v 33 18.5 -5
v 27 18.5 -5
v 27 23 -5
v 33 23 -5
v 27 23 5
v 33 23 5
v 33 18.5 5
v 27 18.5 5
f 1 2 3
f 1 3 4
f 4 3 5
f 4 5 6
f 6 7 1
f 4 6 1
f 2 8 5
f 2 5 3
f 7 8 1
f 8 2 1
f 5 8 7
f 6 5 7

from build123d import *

# Parameters (mm, degrees)
BOSS_EXTRUDE1_DEPTH      = 12
BOSS_EXTRUDE2_START      = -2
BOSS_EXTRUDE2_DEPTH      = 2
SKETCH4_W                = 6
SKETCH4_H                = 4.8
BOSS_EXTRUDE3_DEPTH      = 22
BOSS_EXTRUDE4_DEPTH      = 3
BOSS_EXTRUDE4_DEPTH_BACK = 1.5
SKETCH5_W                = 6
SKETCH5_H                = 10
INTERSECT1_START         = -2
INTERSECT1_DEPTH         = 20.5


# Read off the part's stored shape, not the designer's step: Intersect1
with BuildPart() as part:
    # Sketch1 → Boss-Extrude1 (new body)
    with BuildSketch(Plane(origin=(0, 0, 0), x_dir=(1, 0, 0), z_dir=(0, 1, 0))):
        with BuildLine():
            Line((2.5, 27.386127875), (2.5, 25.377155081))
            ThreePointArc((2.5, 25.377155081), (25.5, 0), (2.5, -25.377155081))
            Line((2.5, -25.377155081), (2.5, -27.386127875))
            ThreePointArc((2.5, -27.386127875), (27.5, 0), (2.5, 27.386127875))
        make_face()
    extrude(amount=BOSS_EXTRUDE1_DEPTH)

    # Sketch2 → Boss-Extrude2 (add)
    with BuildSketch(Plane(origin=(0, 0, 0), x_dir=(1, 0, 0), z_dir=(0, 1, 0)).offset(BOSS_EXTRUDE2_START)):
        with BuildLine():
            Line((2.5, 27.386127875), (1.863636364, 20.415113507))
            ThreePointArc((1.863636364, 20.415113507), (20.5, 0), (1.863636364, -20.415113507))
            Line((1.863636364, -20.415113507), (2.5, -27.386127875))
            ThreePointArc((2.5, -27.386127875), (27.5, 0), (2.5, 27.386127875))
        make_face()
    extrude(amount=BOSS_EXTRUDE2_DEPTH)

    # Sketch4 → Boss-Extrude3 (add)
    with BuildSketch(Plane(origin=(0, -2, 0), x_dir=(1, 0, 0), z_dir=(0, 1, 0))):
        with Locations((30, 0)):
            Rectangle(SKETCH4_W, SKETCH4_H)
    extrude(amount=BOSS_EXTRUDE3_DEPTH)

    # Sketch5 → Boss-Extrude4 (add, two sides: drawn at the far end of the back side and taken through both)
    with BuildSketch(Plane(origin=(0, 20, 0), x_dir=(1, 0, 0), z_dir=(0, 1, 0)).offset(-BOSS_EXTRUDE4_DEPTH_BACK)):
        with Locations((30, 0)):
            Rectangle(SKETCH5_W, SKETCH5_H)
    extrude(amount=BOSS_EXTRUDE4_DEPTH + BOSS_EXTRUDE4_DEPTH_BACK)

    # Intersect1 outline → Intersect1 (cut)
    with BuildSketch(Plane(origin=(0, 0, 0), x_dir=(1, 0, 0), z_dir=(0, 1, 0)).offset(INTERSECT1_START)):
        with BuildLine():
            ThreePointArc((2.5, -27.386127875), (19.480900576, -19.409907593), (27.39507255, -2.4))
            Line((27.39507255, -2.4), (33, -2.4))
            Line((33, -2.4), (33, 2.4))
            Line((33, 2.4), (27.39507255, 2.4))
            ThreePointArc((27.39507255, 2.4), (19.480900576, 19.409907593), (2.5, 27.386127875))
            Line((2.5, 27.386127875), (1.863636364, 20.415113507))
            ThreePointArc((1.863636364, 20.415113507), (20.5, 0), (1.863636364, -20.415113507))
            Line((1.863636364, -20.415113507), (2.5, -27.386127875))
        make_face()
    extrude(amount=INTERSECT1_DEPTH, mode=Mode.SUBTRACT)


solid = part.part
